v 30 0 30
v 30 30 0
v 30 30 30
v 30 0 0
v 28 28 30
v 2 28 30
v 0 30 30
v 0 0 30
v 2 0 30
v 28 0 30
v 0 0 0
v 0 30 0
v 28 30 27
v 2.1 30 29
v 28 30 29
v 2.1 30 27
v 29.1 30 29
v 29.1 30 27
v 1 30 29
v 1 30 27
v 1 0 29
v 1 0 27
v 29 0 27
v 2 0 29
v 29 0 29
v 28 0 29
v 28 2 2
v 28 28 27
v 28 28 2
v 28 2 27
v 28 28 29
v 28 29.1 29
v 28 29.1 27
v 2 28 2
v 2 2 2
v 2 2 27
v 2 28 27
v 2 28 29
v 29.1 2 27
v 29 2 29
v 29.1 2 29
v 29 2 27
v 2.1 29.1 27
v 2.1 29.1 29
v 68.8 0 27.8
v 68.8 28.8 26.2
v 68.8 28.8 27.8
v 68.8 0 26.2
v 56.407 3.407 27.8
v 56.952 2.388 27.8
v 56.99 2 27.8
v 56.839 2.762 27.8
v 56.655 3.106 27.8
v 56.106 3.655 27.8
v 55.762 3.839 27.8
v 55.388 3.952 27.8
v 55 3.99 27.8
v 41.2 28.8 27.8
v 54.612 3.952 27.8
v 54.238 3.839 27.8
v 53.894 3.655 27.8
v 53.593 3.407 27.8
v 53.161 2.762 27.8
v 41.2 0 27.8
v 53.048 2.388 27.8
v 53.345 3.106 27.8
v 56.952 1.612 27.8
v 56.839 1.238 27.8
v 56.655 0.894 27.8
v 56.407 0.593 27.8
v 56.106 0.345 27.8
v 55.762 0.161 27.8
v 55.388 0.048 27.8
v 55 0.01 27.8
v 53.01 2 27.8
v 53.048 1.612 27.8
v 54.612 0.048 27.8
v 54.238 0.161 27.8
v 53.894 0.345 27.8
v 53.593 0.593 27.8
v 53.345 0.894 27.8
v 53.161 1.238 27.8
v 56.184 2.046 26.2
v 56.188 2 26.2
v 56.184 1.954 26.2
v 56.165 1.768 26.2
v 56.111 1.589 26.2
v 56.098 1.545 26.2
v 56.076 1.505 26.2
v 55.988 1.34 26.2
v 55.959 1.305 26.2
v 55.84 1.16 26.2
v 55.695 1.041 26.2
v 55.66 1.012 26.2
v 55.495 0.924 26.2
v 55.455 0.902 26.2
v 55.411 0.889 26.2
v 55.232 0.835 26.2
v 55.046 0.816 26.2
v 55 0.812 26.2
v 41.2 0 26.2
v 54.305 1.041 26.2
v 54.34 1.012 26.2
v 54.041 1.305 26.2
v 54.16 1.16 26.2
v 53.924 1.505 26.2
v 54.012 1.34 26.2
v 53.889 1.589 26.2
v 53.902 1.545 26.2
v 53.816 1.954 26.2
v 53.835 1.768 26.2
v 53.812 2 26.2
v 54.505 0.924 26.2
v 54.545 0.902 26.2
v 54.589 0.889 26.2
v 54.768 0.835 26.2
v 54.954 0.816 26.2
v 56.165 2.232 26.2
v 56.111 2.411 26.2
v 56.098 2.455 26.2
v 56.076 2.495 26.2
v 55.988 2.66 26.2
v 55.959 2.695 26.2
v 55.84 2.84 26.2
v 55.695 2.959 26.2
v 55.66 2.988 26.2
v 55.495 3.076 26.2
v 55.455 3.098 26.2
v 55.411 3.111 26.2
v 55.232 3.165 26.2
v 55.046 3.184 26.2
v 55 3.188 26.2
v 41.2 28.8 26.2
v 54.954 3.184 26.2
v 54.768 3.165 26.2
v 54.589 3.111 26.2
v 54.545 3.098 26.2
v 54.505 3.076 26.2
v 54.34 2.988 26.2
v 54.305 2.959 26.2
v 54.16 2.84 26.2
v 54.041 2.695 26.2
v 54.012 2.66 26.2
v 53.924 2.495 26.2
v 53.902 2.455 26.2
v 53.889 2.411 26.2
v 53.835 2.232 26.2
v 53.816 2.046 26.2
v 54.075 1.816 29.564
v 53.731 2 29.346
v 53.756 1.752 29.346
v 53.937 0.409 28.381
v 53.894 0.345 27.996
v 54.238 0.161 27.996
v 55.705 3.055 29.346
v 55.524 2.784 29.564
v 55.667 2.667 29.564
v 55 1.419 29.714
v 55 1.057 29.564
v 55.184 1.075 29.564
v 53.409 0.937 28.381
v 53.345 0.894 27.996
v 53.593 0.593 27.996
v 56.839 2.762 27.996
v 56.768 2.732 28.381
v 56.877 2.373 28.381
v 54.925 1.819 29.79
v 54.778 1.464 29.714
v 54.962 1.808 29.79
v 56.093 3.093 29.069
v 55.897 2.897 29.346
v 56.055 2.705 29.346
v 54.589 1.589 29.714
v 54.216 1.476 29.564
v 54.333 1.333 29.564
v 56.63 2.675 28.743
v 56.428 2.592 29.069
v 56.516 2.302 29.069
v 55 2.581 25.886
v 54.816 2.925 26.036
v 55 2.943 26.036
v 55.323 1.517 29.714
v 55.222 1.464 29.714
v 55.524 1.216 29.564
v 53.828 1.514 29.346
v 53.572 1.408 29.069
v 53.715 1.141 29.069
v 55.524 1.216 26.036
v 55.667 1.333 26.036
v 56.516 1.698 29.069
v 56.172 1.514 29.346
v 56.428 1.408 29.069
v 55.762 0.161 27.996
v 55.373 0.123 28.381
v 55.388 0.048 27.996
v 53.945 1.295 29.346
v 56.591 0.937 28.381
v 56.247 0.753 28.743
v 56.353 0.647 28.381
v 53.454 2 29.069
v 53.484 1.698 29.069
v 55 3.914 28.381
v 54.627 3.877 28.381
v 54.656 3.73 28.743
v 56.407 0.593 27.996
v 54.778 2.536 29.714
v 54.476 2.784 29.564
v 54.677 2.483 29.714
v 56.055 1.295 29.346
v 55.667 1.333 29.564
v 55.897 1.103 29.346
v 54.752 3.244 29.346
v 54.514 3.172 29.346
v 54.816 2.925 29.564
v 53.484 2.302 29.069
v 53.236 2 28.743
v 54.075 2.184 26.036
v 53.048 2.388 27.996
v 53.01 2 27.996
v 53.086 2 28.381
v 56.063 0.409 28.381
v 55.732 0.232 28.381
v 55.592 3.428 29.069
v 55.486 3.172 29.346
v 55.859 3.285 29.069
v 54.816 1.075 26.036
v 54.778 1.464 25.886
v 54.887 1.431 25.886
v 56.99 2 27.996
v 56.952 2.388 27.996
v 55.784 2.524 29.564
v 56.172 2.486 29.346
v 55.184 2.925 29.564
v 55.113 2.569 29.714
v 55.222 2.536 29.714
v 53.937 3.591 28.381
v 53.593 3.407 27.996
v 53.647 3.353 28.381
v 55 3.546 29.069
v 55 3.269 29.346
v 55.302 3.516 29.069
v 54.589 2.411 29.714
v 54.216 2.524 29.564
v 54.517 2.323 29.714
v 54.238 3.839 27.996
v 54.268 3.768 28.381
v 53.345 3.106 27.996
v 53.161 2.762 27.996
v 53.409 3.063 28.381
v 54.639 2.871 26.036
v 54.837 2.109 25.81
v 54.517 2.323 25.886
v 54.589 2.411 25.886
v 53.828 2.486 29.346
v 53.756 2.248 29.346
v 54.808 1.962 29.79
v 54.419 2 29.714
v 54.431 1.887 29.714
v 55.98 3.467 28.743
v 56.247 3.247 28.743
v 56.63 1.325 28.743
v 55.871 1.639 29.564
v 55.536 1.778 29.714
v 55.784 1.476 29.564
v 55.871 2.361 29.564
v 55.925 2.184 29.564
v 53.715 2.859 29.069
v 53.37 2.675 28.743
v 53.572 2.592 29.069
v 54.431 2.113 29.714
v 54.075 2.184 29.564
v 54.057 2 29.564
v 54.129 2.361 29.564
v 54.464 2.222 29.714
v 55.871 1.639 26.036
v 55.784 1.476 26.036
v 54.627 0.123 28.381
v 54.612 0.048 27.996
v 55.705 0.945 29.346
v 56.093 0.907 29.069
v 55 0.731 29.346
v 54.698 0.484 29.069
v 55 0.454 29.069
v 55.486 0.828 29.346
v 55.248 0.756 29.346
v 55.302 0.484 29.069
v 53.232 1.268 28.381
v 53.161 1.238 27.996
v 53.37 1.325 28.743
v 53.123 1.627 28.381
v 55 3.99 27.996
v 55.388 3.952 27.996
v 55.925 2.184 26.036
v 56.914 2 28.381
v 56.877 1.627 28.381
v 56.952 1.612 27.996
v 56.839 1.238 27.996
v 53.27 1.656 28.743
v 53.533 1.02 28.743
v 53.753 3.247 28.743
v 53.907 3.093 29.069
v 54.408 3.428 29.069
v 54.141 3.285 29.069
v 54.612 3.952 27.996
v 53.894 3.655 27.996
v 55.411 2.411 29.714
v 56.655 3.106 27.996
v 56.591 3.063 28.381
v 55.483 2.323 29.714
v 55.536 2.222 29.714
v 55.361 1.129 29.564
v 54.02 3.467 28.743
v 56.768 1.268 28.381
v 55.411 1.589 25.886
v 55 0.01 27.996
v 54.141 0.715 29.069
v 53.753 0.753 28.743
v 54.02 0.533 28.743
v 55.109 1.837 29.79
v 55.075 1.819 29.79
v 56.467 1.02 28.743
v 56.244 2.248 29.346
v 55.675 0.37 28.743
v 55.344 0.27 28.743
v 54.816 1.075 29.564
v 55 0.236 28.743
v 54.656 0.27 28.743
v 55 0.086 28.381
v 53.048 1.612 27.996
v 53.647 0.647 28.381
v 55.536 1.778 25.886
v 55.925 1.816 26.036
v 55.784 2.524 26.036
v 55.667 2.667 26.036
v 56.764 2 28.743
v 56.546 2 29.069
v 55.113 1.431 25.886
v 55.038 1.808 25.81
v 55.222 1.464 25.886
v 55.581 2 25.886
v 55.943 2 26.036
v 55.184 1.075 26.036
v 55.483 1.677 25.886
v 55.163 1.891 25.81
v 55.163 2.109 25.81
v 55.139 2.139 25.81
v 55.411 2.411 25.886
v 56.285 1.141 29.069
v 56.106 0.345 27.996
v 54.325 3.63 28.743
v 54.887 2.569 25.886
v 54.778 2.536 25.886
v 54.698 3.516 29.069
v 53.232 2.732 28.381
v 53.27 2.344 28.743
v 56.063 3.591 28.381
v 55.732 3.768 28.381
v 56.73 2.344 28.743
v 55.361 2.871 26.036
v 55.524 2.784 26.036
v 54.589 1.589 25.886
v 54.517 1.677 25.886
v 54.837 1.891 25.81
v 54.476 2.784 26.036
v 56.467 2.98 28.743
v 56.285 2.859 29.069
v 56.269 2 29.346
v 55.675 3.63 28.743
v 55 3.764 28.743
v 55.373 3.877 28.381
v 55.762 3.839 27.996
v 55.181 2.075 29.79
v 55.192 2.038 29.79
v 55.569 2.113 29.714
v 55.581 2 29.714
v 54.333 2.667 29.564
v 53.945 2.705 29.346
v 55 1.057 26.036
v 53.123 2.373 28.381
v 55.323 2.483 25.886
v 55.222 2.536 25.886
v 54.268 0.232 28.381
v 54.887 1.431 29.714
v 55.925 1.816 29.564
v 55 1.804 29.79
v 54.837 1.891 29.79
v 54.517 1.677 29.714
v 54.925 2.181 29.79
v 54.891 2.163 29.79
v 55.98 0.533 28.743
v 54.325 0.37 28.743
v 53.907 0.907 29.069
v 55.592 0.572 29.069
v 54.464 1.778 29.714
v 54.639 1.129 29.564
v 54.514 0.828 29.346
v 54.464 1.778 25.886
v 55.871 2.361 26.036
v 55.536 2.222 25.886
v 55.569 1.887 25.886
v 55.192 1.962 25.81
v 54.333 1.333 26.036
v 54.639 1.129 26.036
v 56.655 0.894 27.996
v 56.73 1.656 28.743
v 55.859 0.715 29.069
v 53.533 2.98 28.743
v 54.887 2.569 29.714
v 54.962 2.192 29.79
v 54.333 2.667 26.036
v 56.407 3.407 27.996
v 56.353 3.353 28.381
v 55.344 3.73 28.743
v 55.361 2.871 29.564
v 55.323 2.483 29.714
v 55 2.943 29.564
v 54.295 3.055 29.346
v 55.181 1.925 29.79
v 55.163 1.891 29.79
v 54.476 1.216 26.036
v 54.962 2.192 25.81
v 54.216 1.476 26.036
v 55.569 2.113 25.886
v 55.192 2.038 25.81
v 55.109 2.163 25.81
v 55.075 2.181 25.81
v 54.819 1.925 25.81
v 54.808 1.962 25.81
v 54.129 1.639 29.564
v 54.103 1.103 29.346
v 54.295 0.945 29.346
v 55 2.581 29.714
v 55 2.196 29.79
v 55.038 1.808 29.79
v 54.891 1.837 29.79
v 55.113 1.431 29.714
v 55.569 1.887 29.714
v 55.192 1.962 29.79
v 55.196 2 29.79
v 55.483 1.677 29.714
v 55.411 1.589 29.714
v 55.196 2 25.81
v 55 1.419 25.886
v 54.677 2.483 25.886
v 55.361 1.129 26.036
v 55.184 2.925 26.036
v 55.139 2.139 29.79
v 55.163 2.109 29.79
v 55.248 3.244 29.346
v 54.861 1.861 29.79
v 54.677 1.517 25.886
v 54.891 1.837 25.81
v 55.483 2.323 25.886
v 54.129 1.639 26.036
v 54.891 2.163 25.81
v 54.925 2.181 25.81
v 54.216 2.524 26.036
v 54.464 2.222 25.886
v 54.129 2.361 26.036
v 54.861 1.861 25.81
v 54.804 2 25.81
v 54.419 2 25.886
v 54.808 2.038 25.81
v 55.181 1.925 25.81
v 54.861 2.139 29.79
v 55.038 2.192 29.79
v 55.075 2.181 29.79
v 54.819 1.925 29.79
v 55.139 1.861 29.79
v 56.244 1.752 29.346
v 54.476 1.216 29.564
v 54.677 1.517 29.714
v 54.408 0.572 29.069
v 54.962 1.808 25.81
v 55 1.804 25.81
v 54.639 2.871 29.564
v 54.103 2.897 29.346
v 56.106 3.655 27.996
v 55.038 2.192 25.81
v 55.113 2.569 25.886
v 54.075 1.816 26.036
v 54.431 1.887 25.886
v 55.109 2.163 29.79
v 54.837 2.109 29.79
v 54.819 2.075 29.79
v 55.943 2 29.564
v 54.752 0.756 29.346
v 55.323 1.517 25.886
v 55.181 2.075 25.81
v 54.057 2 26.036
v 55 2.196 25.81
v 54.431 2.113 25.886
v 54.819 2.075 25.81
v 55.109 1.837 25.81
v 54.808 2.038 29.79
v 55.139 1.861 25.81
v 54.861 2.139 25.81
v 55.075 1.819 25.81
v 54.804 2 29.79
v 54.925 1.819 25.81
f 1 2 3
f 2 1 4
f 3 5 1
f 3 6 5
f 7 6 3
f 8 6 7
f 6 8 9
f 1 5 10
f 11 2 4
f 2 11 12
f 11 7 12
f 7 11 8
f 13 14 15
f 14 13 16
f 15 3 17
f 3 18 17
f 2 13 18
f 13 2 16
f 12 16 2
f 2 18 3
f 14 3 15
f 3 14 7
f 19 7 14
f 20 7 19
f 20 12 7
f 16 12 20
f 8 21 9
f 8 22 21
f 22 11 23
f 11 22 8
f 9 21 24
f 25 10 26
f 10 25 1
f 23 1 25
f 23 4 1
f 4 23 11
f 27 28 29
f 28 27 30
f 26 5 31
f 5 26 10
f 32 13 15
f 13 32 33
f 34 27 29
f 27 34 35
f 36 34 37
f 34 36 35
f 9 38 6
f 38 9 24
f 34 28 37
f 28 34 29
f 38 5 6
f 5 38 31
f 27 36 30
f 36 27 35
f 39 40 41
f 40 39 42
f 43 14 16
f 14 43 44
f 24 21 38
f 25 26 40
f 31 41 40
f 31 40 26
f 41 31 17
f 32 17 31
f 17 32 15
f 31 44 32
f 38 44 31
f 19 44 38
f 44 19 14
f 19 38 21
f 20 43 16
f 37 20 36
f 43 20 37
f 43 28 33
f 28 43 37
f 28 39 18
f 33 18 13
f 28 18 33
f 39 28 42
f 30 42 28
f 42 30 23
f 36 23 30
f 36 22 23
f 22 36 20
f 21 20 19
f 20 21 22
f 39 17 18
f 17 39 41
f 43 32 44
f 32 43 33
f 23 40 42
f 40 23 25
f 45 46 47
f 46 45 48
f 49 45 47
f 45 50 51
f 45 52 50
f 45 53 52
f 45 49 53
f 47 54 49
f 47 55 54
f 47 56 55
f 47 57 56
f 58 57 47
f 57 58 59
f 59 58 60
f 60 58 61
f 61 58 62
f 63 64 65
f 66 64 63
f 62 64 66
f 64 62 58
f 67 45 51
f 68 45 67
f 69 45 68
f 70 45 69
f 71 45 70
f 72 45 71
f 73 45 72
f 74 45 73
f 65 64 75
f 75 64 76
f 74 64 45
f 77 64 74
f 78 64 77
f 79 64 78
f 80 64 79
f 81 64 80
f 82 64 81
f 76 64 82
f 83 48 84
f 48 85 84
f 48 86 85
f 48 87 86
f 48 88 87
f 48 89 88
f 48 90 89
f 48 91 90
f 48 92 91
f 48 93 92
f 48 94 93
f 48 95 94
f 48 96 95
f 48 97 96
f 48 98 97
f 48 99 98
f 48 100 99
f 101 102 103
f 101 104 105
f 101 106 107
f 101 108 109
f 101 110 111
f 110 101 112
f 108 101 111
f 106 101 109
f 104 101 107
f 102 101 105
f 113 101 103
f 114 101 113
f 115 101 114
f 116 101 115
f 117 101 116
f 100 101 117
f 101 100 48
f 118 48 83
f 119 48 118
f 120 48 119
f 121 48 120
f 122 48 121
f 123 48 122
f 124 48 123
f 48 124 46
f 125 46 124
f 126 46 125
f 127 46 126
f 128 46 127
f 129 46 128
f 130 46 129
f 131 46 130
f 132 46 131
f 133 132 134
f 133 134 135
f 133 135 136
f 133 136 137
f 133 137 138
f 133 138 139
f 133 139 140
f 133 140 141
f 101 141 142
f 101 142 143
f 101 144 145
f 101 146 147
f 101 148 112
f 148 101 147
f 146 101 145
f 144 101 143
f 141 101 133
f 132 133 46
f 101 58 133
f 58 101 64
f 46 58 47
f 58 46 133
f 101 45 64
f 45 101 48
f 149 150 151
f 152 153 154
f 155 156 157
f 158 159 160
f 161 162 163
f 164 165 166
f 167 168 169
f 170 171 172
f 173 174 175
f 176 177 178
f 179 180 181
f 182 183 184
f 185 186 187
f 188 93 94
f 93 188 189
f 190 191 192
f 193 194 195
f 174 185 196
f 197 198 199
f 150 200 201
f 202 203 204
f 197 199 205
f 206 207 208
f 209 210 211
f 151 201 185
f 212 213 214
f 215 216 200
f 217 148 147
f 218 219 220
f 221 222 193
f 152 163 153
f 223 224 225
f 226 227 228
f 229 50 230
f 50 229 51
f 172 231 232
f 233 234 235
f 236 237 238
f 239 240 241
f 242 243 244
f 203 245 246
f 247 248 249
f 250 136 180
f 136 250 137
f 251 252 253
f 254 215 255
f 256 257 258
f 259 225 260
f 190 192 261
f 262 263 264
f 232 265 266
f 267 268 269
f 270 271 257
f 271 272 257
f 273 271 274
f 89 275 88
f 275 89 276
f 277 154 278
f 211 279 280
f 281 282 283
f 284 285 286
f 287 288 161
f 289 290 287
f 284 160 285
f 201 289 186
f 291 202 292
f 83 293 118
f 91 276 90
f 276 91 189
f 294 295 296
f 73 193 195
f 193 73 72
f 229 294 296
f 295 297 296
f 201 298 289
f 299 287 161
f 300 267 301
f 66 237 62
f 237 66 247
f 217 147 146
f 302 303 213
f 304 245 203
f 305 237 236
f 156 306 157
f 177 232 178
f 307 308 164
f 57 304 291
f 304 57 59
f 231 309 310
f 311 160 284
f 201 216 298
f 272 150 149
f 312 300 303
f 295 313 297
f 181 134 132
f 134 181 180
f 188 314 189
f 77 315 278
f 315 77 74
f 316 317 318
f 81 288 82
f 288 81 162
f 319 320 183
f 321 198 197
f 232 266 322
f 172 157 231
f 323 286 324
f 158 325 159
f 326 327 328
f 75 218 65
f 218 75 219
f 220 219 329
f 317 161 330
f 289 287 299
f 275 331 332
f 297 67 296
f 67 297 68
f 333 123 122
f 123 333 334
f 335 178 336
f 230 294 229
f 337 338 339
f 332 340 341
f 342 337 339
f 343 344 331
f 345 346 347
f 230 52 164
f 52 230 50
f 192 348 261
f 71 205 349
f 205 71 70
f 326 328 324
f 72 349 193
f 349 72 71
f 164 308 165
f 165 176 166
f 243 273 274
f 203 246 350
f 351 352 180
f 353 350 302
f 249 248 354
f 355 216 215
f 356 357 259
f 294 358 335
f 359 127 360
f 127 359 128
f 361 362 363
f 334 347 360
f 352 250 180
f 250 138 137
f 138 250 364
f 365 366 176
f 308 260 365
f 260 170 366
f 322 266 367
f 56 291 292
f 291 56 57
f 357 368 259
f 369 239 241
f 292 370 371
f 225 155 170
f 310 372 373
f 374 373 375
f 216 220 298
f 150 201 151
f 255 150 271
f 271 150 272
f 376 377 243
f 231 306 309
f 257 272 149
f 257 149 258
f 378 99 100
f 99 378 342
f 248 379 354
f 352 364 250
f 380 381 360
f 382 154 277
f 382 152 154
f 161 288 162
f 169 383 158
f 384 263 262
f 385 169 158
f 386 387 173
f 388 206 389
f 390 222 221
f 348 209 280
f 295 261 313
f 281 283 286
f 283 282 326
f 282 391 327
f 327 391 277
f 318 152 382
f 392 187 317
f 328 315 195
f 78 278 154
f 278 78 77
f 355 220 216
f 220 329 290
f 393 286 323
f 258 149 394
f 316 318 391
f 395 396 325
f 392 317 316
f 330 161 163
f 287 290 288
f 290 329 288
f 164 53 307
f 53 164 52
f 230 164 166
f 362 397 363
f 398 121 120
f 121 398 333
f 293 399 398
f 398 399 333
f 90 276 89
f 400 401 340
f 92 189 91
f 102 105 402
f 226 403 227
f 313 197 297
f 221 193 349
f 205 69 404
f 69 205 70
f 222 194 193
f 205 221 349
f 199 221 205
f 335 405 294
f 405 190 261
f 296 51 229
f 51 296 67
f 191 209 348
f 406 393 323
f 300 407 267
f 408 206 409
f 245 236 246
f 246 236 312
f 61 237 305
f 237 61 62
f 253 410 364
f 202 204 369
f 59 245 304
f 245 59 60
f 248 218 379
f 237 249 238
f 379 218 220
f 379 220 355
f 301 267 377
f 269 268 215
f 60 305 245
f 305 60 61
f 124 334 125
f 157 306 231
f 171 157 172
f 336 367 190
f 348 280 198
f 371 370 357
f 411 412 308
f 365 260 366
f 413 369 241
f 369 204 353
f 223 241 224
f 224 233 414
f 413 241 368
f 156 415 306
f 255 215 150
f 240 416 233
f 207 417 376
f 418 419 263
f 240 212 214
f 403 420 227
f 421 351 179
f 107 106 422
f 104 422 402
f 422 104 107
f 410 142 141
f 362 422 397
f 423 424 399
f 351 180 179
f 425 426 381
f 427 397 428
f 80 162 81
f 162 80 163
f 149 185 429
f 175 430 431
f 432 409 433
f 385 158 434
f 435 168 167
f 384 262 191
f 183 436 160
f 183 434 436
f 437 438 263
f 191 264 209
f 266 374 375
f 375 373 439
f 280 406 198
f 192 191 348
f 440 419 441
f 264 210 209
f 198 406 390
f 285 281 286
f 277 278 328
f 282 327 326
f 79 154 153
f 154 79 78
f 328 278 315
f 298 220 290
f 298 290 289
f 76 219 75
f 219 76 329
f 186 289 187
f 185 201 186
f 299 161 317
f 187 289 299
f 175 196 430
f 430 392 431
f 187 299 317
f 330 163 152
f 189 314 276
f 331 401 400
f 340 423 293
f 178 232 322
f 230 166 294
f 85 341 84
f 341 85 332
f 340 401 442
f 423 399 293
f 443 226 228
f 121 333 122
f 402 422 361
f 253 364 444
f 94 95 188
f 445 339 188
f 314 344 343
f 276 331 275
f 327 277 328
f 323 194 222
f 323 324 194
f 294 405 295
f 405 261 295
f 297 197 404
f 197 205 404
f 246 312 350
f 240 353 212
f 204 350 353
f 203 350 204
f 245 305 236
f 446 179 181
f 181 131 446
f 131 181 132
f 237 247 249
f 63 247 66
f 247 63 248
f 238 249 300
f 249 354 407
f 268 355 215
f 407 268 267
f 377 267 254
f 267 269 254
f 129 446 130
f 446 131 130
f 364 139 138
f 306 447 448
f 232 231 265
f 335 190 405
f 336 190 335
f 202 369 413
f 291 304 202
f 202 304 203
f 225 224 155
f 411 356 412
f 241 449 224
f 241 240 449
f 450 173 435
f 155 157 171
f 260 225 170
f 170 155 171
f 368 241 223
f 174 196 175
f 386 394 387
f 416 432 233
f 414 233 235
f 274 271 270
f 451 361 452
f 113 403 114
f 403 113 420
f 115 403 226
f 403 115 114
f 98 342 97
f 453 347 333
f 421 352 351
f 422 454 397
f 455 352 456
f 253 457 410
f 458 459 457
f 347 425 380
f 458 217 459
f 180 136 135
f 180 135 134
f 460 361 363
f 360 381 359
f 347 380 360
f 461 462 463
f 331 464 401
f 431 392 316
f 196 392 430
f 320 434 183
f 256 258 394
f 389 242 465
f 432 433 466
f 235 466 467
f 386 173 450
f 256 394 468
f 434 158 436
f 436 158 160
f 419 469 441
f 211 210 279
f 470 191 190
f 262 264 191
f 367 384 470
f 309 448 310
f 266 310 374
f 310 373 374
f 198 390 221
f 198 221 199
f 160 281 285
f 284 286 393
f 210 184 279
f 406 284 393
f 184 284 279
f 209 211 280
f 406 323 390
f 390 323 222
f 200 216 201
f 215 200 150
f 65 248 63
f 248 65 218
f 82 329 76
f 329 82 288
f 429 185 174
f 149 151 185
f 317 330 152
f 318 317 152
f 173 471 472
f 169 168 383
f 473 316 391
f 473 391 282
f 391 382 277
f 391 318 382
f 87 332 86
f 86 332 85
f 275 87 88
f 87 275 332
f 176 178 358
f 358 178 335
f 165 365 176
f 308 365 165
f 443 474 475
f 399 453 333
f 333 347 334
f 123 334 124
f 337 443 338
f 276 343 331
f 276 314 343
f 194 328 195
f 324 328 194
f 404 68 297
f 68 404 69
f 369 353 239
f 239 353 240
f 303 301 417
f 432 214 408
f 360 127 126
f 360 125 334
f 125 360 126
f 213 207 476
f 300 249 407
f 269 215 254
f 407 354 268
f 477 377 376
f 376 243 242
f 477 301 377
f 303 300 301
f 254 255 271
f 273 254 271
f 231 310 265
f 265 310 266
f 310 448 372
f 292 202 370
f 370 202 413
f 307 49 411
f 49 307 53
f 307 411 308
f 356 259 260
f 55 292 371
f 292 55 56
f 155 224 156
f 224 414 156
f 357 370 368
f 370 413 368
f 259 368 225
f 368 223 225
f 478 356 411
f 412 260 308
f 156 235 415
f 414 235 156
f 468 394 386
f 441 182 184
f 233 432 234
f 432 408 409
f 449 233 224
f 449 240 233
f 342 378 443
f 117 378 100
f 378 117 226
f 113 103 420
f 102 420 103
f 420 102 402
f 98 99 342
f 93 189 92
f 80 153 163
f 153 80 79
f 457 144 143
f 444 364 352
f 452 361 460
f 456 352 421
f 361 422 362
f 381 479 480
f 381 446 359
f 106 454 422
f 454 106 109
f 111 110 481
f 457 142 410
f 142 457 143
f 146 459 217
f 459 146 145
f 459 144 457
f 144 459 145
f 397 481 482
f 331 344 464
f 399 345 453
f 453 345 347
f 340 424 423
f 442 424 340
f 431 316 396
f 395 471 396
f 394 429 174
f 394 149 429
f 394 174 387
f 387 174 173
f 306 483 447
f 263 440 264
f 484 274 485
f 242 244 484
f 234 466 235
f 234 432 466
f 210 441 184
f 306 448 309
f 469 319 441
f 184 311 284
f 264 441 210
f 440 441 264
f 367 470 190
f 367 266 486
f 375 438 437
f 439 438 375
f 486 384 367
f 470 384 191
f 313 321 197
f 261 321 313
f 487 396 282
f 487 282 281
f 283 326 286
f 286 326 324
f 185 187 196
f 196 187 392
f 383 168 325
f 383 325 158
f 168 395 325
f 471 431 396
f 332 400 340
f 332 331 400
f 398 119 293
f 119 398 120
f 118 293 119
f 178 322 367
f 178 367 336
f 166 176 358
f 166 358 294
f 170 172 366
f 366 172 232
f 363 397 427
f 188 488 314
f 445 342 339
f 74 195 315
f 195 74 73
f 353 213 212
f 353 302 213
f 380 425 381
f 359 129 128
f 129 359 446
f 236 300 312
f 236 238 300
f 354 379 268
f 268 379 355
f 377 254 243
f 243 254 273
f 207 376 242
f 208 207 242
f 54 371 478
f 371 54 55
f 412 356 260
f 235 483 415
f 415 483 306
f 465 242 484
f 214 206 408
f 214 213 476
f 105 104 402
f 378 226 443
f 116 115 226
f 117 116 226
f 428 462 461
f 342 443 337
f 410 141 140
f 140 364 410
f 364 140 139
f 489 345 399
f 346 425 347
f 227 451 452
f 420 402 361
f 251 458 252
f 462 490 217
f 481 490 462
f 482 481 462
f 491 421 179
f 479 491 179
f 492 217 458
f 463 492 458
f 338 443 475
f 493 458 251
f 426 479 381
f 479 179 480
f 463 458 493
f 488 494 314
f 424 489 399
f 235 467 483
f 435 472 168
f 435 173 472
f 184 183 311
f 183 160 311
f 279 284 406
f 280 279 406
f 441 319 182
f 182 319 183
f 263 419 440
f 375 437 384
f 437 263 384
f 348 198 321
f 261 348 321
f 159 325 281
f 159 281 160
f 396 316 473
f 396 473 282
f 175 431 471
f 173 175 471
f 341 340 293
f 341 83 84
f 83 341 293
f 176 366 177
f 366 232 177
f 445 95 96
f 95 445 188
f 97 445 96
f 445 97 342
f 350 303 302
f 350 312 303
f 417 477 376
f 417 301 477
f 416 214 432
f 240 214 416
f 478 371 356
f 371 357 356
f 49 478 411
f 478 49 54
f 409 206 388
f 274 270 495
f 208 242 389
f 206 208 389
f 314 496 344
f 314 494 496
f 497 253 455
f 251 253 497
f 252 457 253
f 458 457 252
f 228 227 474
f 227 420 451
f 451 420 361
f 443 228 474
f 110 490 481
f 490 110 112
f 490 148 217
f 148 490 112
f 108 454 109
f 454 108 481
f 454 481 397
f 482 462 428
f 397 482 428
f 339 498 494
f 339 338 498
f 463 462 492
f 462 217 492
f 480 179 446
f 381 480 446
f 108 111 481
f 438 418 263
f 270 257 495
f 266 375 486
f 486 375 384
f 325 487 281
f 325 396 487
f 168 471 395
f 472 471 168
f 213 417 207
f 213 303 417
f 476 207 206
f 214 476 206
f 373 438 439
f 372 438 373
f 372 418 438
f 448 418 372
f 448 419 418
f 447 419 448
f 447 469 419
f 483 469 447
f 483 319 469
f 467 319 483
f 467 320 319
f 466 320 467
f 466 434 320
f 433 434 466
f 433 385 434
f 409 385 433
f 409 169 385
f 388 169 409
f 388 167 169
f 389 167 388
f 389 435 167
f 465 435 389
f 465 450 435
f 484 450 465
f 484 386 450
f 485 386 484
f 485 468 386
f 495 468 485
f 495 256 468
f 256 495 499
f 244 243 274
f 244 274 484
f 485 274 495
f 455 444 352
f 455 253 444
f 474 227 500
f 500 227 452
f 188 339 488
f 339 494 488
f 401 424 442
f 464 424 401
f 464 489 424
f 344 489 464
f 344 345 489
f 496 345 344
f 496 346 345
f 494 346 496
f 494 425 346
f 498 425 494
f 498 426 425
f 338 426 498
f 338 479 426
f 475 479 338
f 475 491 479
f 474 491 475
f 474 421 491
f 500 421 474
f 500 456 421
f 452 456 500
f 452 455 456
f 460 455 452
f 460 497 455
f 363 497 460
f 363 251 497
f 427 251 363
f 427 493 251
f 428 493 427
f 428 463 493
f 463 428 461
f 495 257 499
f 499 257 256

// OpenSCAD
// Google Gemini generated code for the box, I did some minor tweaks, 
// and I added the circle loop to attched to the AI generated code for the box.
//
// rwhiffen - https://github.com/rwhiffen/OpenSCAD/tree/main/modi-loop-box
//
// --- Parameters ---
size = 30;              // External cube size (30mm)
wall = 2;               // Wall thickness (2mm)
tolerance = 0.2;        // Printing gap (0.2mm)
groove_h = 2;           // Height of the sliding track
groove_d = 1;           // How deep the track cuts into the wall
lid_offset_h = 1;       // offset from top of the lid - allows for lid to be positioned independantly
loop_percentage = 0.6;   // what percentage 0.00 -> 1.00 down the face should the loop be - allows for shifting the loop to allign with rails
segment_count = 80;    // smoothness of loop

// --- Calculations ---
inner_size = size - (wall * 2);

// Render Selection (Change to "lid" or "box")
part = "both"; // [box, lid, both]

if (part == "box" || part == "both") {
    box();
}

if (part == "lid" || part == "both") {
    // Moves the lid to the side for viewing, or sits it on top
    translate([part == "both" ? size + 10 : 0, 0, size - wall - groove_h + tolerance]) 
        lid();
}

module box() {
    difference() {
        // 1. Main Cube Body
        cube([size, size, size]);
        
        // 2. Internal Cavity (The hollow center)
        translate([wall, wall, wall])
            cube([inner_size, inner_size, size]);
        
        // 3. The Tracks (Left, Right, and Back)
        // Left Track
        translate([wall - groove_d, wall, size - wall - lid_offset_h])
            cube([groove_d + 0.1, size - wall, groove_h]);
        
        // Right Track
        translate([size - wall, wall, size - wall - lid_offset_h])
            cube([groove_d + 0.1, size - wall, groove_h]);
            
        // Back Track (Stops the lid from sliding out the back)
        translate([wall, size - wall, size - wall - lid_offset_h])
            cube([inner_size, groove_d + 0.1, groove_h]);

        // 4. FRONT ENTRANCE CUTOUT (This allows the lid to slide in)
        // We cut out the top section of the front wall
        // plus the bridge
        translate([wall - groove_d, -0.1, size - wall - lid_offset_h])
            cube([inner_size + (groove_d * 2), wall + 0.2, groove_h]);
        translate([wall , -0.1, size - wall])
            cube([inner_size , wall + 0.2, groove_h]);
    
    }
}

module lid() {
    // The lid width must account for the grooves on both sides minus tolerance
    lid_w = inner_size + (groove_d * 2) - (tolerance * 2);
    // The lid length goes from the front face to the back groove
    lid_l = (size - wall) + groove_d - tolerance;
    lid_h = groove_h - (tolerance * 2);
    
    union() {
        // The main sliding plate
        // Centered horizontally within the tracks
        translate([wall - groove_d + tolerance, 0, 0])
            cube([lid_w, lid_l, lid_h]);
            
        // Optional: Small pull-tab or notch on the front
        translate([size/2, 2, lid_h])
            sphere(r = 2, $fn=32);
    }
}
